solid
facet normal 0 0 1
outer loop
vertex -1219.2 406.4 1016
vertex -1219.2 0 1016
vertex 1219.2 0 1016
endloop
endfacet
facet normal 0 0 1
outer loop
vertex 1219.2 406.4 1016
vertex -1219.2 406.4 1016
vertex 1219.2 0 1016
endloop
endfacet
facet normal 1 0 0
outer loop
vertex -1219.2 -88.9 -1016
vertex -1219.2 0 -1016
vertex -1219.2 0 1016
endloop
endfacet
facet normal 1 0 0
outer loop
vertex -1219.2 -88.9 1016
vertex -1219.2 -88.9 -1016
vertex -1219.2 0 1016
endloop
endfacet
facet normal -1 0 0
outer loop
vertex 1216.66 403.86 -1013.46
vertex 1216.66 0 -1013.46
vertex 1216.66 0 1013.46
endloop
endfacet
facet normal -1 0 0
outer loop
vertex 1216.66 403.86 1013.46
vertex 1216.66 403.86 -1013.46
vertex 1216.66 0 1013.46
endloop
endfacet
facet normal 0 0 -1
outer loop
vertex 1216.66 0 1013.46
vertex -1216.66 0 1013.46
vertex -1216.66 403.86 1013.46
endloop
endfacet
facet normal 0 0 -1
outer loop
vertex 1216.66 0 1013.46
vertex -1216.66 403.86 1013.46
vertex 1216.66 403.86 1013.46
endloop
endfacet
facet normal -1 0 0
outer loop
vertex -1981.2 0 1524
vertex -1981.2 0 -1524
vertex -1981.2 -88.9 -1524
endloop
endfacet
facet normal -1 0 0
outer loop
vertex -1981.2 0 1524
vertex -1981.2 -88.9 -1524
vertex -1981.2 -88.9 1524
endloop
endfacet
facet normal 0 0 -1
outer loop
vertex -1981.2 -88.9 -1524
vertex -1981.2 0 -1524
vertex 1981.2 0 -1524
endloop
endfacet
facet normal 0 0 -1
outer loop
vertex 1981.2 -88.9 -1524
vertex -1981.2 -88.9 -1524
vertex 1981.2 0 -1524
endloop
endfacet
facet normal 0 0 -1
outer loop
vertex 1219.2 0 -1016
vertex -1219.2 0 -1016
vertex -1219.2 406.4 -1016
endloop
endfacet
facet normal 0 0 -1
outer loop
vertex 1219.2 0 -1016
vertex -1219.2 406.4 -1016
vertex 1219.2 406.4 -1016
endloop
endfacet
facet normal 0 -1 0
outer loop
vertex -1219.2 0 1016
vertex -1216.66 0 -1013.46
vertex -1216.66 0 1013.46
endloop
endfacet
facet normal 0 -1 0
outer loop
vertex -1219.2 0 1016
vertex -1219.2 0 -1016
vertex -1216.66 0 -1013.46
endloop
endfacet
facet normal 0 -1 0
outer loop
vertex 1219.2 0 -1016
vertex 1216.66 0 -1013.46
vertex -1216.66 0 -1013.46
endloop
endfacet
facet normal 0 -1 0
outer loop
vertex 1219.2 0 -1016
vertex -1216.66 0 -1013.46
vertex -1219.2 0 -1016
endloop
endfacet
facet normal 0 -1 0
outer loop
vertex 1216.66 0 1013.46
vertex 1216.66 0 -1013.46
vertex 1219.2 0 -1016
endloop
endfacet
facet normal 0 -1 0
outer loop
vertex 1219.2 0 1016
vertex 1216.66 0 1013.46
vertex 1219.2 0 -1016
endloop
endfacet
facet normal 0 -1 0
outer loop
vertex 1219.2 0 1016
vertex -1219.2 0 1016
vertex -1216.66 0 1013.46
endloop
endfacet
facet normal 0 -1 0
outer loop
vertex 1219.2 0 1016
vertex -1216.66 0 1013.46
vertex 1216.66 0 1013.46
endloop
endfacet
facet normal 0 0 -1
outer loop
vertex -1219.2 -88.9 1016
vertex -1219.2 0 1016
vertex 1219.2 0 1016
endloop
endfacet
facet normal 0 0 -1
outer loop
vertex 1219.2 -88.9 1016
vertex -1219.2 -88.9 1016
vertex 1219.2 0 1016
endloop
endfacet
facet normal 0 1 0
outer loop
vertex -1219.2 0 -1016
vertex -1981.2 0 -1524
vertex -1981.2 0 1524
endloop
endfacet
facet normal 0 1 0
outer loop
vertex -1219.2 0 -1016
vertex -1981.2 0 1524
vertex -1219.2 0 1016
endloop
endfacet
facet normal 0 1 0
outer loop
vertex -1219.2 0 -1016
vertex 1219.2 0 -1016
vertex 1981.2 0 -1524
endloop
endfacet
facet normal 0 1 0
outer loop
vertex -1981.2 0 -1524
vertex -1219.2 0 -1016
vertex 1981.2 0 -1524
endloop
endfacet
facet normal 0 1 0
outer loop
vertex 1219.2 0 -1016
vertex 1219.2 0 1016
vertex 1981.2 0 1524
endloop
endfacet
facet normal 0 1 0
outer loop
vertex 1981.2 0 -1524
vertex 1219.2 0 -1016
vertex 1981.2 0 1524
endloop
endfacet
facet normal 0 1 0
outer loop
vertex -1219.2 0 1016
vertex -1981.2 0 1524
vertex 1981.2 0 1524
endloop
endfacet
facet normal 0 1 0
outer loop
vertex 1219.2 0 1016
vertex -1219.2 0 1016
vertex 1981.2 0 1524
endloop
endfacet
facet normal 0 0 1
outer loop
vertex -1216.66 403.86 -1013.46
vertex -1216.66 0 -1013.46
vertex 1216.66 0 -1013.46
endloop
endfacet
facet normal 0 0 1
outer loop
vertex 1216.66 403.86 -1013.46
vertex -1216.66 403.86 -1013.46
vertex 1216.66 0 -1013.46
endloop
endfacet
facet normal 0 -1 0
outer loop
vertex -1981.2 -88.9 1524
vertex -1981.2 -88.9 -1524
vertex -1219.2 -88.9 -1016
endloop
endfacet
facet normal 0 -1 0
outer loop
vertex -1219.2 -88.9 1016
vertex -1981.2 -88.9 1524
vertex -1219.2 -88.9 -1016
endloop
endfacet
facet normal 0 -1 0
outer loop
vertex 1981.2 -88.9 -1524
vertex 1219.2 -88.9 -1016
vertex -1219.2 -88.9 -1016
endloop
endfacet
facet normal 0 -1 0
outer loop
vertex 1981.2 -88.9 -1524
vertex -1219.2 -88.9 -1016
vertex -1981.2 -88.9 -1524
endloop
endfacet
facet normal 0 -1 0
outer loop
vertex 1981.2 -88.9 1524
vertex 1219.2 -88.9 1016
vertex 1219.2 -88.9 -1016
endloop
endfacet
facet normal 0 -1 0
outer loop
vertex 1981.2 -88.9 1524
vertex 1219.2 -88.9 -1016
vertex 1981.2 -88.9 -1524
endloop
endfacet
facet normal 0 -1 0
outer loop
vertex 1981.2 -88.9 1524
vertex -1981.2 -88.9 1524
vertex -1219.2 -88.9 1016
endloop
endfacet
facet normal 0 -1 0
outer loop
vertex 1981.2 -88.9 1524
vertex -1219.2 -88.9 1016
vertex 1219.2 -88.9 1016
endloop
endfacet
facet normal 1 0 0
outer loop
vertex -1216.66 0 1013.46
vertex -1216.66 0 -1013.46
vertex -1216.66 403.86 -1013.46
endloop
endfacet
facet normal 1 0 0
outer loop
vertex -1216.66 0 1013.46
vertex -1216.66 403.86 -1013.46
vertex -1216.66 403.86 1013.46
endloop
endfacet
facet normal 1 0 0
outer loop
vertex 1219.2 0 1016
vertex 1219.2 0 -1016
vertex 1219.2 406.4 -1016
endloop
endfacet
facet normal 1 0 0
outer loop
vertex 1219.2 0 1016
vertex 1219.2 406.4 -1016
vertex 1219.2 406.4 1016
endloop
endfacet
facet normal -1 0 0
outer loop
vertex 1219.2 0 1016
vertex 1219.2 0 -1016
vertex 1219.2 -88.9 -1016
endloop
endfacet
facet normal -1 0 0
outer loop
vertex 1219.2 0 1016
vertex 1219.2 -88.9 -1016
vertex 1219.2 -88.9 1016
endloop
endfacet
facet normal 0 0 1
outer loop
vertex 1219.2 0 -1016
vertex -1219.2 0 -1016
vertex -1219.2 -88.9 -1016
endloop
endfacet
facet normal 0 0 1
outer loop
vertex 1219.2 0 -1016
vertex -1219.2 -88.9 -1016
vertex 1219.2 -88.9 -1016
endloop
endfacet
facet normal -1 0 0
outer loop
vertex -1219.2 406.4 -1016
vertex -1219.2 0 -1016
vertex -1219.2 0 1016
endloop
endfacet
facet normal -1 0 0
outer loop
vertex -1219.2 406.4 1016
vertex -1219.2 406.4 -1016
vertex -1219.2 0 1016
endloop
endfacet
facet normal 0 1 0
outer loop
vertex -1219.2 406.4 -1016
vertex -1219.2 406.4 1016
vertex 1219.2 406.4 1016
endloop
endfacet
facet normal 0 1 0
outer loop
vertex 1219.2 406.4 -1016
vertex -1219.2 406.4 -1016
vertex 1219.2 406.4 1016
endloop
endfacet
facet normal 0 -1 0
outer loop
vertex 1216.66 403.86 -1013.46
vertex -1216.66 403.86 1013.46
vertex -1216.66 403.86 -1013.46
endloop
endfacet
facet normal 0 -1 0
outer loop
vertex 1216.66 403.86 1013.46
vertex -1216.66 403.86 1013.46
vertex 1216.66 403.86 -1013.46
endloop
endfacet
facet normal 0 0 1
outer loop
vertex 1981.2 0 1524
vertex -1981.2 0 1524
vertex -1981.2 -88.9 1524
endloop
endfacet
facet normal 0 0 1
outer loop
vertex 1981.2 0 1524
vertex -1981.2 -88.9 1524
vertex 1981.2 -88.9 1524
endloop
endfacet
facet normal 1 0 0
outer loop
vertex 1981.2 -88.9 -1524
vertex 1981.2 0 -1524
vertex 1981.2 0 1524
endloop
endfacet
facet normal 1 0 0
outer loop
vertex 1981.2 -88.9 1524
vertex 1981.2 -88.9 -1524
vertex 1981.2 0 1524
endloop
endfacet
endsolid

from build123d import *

# Parameters (mm, degrees)
F0_W     = 3962.4
F0_H     = 3048
F0_W_2   = 2438.4
F0_H_2   = 2032
F1_DEPTH = 88.9
F2_DEPTH = 406.4
F3_T     = -2.54


with BuildPart() as f1:
    # F0 (on Front) → F1 (new body)
    with BuildSketch(Plane.XZ):
        Rectangle(F0_W, F0_H)
        Rectangle(F0_W_2, F0_H_2, mode=Mode.SUBTRACT)
    extrude(amount=F1_DEPTH)


with BuildPart() as f2:
    # F0 (on Front) → F2 (new body)
    with BuildSketch(Plane.XZ):
        Rectangle(F0_W_2, F0_H_2)
    extrude(amount=-F2_DEPTH)

    # F3
    f3_openings = [f2.faces().sort_by_distance(p)[0] for p in [
        (0, 0, 0),
    ]]
    offset(amount=F3_T, openings=f3_openings)


solid = Compound([f1.part, f2.part])
